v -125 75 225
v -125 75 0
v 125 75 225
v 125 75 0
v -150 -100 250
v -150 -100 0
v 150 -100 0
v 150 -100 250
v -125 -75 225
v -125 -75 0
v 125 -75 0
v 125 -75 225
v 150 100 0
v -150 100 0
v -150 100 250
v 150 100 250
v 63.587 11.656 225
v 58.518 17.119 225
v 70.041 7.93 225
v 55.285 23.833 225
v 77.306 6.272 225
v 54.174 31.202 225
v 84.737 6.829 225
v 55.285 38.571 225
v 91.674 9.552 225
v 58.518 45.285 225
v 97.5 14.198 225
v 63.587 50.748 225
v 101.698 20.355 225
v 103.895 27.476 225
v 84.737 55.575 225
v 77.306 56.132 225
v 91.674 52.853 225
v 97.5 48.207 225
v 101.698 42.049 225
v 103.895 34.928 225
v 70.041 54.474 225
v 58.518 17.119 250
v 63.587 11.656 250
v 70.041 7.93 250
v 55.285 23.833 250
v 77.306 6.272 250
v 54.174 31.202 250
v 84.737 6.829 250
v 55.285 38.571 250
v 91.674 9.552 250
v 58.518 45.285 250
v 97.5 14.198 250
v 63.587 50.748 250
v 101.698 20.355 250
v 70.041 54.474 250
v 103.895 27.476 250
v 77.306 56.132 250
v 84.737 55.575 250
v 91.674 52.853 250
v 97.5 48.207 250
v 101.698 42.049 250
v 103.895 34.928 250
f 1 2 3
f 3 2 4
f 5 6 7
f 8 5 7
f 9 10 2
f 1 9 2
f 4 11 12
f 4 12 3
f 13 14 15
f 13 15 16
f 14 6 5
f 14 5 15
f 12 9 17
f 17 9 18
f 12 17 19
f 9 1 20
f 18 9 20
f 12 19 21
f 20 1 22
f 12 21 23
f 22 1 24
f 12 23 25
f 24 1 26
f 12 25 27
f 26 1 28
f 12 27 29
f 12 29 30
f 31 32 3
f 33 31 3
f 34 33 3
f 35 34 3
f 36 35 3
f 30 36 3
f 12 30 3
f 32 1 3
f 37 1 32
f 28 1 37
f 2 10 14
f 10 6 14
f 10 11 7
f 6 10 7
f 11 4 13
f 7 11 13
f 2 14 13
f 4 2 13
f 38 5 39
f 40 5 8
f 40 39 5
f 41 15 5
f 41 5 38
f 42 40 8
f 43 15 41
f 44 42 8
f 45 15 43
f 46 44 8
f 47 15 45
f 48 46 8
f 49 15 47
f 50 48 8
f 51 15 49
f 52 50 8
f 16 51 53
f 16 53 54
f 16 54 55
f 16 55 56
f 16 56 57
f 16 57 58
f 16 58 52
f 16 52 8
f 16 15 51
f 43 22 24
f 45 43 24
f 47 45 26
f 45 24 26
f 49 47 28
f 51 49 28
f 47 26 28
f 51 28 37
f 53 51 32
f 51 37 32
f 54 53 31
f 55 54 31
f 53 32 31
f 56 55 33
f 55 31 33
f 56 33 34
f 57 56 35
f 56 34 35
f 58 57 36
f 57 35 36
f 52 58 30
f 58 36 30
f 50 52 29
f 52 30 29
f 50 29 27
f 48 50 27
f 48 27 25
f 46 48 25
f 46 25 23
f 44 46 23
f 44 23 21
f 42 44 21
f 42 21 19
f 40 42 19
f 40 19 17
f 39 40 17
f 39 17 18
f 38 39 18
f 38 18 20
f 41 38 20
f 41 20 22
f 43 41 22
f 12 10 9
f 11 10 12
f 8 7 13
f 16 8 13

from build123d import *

# Parameters (mm, degrees)
F0_W     = 300
F0_H     = 200
F1_DEPTH = 250
F2_T     = -25
F4_D     = 50


with BuildPart() as f1:
    # F0 (on Top) → F1 (new body)
    with BuildSketch(Plane.XY):
        Rectangle(F0_W, F0_H)
    extrude(amount=F1_DEPTH)

    # F2
    f2_openings = [f1.faces().sort_by_distance(p)[0] for p in [
        (0, 0, 0),
    ]]
    offset(amount=F2_T, openings=f2_openings)

    # F4 (through all)
    with Locations(Plane.XY.offset(250)):
        with Locations((79.174198, 31.202247)):
            Hole(F4_D / 2)


solid = f1.part
